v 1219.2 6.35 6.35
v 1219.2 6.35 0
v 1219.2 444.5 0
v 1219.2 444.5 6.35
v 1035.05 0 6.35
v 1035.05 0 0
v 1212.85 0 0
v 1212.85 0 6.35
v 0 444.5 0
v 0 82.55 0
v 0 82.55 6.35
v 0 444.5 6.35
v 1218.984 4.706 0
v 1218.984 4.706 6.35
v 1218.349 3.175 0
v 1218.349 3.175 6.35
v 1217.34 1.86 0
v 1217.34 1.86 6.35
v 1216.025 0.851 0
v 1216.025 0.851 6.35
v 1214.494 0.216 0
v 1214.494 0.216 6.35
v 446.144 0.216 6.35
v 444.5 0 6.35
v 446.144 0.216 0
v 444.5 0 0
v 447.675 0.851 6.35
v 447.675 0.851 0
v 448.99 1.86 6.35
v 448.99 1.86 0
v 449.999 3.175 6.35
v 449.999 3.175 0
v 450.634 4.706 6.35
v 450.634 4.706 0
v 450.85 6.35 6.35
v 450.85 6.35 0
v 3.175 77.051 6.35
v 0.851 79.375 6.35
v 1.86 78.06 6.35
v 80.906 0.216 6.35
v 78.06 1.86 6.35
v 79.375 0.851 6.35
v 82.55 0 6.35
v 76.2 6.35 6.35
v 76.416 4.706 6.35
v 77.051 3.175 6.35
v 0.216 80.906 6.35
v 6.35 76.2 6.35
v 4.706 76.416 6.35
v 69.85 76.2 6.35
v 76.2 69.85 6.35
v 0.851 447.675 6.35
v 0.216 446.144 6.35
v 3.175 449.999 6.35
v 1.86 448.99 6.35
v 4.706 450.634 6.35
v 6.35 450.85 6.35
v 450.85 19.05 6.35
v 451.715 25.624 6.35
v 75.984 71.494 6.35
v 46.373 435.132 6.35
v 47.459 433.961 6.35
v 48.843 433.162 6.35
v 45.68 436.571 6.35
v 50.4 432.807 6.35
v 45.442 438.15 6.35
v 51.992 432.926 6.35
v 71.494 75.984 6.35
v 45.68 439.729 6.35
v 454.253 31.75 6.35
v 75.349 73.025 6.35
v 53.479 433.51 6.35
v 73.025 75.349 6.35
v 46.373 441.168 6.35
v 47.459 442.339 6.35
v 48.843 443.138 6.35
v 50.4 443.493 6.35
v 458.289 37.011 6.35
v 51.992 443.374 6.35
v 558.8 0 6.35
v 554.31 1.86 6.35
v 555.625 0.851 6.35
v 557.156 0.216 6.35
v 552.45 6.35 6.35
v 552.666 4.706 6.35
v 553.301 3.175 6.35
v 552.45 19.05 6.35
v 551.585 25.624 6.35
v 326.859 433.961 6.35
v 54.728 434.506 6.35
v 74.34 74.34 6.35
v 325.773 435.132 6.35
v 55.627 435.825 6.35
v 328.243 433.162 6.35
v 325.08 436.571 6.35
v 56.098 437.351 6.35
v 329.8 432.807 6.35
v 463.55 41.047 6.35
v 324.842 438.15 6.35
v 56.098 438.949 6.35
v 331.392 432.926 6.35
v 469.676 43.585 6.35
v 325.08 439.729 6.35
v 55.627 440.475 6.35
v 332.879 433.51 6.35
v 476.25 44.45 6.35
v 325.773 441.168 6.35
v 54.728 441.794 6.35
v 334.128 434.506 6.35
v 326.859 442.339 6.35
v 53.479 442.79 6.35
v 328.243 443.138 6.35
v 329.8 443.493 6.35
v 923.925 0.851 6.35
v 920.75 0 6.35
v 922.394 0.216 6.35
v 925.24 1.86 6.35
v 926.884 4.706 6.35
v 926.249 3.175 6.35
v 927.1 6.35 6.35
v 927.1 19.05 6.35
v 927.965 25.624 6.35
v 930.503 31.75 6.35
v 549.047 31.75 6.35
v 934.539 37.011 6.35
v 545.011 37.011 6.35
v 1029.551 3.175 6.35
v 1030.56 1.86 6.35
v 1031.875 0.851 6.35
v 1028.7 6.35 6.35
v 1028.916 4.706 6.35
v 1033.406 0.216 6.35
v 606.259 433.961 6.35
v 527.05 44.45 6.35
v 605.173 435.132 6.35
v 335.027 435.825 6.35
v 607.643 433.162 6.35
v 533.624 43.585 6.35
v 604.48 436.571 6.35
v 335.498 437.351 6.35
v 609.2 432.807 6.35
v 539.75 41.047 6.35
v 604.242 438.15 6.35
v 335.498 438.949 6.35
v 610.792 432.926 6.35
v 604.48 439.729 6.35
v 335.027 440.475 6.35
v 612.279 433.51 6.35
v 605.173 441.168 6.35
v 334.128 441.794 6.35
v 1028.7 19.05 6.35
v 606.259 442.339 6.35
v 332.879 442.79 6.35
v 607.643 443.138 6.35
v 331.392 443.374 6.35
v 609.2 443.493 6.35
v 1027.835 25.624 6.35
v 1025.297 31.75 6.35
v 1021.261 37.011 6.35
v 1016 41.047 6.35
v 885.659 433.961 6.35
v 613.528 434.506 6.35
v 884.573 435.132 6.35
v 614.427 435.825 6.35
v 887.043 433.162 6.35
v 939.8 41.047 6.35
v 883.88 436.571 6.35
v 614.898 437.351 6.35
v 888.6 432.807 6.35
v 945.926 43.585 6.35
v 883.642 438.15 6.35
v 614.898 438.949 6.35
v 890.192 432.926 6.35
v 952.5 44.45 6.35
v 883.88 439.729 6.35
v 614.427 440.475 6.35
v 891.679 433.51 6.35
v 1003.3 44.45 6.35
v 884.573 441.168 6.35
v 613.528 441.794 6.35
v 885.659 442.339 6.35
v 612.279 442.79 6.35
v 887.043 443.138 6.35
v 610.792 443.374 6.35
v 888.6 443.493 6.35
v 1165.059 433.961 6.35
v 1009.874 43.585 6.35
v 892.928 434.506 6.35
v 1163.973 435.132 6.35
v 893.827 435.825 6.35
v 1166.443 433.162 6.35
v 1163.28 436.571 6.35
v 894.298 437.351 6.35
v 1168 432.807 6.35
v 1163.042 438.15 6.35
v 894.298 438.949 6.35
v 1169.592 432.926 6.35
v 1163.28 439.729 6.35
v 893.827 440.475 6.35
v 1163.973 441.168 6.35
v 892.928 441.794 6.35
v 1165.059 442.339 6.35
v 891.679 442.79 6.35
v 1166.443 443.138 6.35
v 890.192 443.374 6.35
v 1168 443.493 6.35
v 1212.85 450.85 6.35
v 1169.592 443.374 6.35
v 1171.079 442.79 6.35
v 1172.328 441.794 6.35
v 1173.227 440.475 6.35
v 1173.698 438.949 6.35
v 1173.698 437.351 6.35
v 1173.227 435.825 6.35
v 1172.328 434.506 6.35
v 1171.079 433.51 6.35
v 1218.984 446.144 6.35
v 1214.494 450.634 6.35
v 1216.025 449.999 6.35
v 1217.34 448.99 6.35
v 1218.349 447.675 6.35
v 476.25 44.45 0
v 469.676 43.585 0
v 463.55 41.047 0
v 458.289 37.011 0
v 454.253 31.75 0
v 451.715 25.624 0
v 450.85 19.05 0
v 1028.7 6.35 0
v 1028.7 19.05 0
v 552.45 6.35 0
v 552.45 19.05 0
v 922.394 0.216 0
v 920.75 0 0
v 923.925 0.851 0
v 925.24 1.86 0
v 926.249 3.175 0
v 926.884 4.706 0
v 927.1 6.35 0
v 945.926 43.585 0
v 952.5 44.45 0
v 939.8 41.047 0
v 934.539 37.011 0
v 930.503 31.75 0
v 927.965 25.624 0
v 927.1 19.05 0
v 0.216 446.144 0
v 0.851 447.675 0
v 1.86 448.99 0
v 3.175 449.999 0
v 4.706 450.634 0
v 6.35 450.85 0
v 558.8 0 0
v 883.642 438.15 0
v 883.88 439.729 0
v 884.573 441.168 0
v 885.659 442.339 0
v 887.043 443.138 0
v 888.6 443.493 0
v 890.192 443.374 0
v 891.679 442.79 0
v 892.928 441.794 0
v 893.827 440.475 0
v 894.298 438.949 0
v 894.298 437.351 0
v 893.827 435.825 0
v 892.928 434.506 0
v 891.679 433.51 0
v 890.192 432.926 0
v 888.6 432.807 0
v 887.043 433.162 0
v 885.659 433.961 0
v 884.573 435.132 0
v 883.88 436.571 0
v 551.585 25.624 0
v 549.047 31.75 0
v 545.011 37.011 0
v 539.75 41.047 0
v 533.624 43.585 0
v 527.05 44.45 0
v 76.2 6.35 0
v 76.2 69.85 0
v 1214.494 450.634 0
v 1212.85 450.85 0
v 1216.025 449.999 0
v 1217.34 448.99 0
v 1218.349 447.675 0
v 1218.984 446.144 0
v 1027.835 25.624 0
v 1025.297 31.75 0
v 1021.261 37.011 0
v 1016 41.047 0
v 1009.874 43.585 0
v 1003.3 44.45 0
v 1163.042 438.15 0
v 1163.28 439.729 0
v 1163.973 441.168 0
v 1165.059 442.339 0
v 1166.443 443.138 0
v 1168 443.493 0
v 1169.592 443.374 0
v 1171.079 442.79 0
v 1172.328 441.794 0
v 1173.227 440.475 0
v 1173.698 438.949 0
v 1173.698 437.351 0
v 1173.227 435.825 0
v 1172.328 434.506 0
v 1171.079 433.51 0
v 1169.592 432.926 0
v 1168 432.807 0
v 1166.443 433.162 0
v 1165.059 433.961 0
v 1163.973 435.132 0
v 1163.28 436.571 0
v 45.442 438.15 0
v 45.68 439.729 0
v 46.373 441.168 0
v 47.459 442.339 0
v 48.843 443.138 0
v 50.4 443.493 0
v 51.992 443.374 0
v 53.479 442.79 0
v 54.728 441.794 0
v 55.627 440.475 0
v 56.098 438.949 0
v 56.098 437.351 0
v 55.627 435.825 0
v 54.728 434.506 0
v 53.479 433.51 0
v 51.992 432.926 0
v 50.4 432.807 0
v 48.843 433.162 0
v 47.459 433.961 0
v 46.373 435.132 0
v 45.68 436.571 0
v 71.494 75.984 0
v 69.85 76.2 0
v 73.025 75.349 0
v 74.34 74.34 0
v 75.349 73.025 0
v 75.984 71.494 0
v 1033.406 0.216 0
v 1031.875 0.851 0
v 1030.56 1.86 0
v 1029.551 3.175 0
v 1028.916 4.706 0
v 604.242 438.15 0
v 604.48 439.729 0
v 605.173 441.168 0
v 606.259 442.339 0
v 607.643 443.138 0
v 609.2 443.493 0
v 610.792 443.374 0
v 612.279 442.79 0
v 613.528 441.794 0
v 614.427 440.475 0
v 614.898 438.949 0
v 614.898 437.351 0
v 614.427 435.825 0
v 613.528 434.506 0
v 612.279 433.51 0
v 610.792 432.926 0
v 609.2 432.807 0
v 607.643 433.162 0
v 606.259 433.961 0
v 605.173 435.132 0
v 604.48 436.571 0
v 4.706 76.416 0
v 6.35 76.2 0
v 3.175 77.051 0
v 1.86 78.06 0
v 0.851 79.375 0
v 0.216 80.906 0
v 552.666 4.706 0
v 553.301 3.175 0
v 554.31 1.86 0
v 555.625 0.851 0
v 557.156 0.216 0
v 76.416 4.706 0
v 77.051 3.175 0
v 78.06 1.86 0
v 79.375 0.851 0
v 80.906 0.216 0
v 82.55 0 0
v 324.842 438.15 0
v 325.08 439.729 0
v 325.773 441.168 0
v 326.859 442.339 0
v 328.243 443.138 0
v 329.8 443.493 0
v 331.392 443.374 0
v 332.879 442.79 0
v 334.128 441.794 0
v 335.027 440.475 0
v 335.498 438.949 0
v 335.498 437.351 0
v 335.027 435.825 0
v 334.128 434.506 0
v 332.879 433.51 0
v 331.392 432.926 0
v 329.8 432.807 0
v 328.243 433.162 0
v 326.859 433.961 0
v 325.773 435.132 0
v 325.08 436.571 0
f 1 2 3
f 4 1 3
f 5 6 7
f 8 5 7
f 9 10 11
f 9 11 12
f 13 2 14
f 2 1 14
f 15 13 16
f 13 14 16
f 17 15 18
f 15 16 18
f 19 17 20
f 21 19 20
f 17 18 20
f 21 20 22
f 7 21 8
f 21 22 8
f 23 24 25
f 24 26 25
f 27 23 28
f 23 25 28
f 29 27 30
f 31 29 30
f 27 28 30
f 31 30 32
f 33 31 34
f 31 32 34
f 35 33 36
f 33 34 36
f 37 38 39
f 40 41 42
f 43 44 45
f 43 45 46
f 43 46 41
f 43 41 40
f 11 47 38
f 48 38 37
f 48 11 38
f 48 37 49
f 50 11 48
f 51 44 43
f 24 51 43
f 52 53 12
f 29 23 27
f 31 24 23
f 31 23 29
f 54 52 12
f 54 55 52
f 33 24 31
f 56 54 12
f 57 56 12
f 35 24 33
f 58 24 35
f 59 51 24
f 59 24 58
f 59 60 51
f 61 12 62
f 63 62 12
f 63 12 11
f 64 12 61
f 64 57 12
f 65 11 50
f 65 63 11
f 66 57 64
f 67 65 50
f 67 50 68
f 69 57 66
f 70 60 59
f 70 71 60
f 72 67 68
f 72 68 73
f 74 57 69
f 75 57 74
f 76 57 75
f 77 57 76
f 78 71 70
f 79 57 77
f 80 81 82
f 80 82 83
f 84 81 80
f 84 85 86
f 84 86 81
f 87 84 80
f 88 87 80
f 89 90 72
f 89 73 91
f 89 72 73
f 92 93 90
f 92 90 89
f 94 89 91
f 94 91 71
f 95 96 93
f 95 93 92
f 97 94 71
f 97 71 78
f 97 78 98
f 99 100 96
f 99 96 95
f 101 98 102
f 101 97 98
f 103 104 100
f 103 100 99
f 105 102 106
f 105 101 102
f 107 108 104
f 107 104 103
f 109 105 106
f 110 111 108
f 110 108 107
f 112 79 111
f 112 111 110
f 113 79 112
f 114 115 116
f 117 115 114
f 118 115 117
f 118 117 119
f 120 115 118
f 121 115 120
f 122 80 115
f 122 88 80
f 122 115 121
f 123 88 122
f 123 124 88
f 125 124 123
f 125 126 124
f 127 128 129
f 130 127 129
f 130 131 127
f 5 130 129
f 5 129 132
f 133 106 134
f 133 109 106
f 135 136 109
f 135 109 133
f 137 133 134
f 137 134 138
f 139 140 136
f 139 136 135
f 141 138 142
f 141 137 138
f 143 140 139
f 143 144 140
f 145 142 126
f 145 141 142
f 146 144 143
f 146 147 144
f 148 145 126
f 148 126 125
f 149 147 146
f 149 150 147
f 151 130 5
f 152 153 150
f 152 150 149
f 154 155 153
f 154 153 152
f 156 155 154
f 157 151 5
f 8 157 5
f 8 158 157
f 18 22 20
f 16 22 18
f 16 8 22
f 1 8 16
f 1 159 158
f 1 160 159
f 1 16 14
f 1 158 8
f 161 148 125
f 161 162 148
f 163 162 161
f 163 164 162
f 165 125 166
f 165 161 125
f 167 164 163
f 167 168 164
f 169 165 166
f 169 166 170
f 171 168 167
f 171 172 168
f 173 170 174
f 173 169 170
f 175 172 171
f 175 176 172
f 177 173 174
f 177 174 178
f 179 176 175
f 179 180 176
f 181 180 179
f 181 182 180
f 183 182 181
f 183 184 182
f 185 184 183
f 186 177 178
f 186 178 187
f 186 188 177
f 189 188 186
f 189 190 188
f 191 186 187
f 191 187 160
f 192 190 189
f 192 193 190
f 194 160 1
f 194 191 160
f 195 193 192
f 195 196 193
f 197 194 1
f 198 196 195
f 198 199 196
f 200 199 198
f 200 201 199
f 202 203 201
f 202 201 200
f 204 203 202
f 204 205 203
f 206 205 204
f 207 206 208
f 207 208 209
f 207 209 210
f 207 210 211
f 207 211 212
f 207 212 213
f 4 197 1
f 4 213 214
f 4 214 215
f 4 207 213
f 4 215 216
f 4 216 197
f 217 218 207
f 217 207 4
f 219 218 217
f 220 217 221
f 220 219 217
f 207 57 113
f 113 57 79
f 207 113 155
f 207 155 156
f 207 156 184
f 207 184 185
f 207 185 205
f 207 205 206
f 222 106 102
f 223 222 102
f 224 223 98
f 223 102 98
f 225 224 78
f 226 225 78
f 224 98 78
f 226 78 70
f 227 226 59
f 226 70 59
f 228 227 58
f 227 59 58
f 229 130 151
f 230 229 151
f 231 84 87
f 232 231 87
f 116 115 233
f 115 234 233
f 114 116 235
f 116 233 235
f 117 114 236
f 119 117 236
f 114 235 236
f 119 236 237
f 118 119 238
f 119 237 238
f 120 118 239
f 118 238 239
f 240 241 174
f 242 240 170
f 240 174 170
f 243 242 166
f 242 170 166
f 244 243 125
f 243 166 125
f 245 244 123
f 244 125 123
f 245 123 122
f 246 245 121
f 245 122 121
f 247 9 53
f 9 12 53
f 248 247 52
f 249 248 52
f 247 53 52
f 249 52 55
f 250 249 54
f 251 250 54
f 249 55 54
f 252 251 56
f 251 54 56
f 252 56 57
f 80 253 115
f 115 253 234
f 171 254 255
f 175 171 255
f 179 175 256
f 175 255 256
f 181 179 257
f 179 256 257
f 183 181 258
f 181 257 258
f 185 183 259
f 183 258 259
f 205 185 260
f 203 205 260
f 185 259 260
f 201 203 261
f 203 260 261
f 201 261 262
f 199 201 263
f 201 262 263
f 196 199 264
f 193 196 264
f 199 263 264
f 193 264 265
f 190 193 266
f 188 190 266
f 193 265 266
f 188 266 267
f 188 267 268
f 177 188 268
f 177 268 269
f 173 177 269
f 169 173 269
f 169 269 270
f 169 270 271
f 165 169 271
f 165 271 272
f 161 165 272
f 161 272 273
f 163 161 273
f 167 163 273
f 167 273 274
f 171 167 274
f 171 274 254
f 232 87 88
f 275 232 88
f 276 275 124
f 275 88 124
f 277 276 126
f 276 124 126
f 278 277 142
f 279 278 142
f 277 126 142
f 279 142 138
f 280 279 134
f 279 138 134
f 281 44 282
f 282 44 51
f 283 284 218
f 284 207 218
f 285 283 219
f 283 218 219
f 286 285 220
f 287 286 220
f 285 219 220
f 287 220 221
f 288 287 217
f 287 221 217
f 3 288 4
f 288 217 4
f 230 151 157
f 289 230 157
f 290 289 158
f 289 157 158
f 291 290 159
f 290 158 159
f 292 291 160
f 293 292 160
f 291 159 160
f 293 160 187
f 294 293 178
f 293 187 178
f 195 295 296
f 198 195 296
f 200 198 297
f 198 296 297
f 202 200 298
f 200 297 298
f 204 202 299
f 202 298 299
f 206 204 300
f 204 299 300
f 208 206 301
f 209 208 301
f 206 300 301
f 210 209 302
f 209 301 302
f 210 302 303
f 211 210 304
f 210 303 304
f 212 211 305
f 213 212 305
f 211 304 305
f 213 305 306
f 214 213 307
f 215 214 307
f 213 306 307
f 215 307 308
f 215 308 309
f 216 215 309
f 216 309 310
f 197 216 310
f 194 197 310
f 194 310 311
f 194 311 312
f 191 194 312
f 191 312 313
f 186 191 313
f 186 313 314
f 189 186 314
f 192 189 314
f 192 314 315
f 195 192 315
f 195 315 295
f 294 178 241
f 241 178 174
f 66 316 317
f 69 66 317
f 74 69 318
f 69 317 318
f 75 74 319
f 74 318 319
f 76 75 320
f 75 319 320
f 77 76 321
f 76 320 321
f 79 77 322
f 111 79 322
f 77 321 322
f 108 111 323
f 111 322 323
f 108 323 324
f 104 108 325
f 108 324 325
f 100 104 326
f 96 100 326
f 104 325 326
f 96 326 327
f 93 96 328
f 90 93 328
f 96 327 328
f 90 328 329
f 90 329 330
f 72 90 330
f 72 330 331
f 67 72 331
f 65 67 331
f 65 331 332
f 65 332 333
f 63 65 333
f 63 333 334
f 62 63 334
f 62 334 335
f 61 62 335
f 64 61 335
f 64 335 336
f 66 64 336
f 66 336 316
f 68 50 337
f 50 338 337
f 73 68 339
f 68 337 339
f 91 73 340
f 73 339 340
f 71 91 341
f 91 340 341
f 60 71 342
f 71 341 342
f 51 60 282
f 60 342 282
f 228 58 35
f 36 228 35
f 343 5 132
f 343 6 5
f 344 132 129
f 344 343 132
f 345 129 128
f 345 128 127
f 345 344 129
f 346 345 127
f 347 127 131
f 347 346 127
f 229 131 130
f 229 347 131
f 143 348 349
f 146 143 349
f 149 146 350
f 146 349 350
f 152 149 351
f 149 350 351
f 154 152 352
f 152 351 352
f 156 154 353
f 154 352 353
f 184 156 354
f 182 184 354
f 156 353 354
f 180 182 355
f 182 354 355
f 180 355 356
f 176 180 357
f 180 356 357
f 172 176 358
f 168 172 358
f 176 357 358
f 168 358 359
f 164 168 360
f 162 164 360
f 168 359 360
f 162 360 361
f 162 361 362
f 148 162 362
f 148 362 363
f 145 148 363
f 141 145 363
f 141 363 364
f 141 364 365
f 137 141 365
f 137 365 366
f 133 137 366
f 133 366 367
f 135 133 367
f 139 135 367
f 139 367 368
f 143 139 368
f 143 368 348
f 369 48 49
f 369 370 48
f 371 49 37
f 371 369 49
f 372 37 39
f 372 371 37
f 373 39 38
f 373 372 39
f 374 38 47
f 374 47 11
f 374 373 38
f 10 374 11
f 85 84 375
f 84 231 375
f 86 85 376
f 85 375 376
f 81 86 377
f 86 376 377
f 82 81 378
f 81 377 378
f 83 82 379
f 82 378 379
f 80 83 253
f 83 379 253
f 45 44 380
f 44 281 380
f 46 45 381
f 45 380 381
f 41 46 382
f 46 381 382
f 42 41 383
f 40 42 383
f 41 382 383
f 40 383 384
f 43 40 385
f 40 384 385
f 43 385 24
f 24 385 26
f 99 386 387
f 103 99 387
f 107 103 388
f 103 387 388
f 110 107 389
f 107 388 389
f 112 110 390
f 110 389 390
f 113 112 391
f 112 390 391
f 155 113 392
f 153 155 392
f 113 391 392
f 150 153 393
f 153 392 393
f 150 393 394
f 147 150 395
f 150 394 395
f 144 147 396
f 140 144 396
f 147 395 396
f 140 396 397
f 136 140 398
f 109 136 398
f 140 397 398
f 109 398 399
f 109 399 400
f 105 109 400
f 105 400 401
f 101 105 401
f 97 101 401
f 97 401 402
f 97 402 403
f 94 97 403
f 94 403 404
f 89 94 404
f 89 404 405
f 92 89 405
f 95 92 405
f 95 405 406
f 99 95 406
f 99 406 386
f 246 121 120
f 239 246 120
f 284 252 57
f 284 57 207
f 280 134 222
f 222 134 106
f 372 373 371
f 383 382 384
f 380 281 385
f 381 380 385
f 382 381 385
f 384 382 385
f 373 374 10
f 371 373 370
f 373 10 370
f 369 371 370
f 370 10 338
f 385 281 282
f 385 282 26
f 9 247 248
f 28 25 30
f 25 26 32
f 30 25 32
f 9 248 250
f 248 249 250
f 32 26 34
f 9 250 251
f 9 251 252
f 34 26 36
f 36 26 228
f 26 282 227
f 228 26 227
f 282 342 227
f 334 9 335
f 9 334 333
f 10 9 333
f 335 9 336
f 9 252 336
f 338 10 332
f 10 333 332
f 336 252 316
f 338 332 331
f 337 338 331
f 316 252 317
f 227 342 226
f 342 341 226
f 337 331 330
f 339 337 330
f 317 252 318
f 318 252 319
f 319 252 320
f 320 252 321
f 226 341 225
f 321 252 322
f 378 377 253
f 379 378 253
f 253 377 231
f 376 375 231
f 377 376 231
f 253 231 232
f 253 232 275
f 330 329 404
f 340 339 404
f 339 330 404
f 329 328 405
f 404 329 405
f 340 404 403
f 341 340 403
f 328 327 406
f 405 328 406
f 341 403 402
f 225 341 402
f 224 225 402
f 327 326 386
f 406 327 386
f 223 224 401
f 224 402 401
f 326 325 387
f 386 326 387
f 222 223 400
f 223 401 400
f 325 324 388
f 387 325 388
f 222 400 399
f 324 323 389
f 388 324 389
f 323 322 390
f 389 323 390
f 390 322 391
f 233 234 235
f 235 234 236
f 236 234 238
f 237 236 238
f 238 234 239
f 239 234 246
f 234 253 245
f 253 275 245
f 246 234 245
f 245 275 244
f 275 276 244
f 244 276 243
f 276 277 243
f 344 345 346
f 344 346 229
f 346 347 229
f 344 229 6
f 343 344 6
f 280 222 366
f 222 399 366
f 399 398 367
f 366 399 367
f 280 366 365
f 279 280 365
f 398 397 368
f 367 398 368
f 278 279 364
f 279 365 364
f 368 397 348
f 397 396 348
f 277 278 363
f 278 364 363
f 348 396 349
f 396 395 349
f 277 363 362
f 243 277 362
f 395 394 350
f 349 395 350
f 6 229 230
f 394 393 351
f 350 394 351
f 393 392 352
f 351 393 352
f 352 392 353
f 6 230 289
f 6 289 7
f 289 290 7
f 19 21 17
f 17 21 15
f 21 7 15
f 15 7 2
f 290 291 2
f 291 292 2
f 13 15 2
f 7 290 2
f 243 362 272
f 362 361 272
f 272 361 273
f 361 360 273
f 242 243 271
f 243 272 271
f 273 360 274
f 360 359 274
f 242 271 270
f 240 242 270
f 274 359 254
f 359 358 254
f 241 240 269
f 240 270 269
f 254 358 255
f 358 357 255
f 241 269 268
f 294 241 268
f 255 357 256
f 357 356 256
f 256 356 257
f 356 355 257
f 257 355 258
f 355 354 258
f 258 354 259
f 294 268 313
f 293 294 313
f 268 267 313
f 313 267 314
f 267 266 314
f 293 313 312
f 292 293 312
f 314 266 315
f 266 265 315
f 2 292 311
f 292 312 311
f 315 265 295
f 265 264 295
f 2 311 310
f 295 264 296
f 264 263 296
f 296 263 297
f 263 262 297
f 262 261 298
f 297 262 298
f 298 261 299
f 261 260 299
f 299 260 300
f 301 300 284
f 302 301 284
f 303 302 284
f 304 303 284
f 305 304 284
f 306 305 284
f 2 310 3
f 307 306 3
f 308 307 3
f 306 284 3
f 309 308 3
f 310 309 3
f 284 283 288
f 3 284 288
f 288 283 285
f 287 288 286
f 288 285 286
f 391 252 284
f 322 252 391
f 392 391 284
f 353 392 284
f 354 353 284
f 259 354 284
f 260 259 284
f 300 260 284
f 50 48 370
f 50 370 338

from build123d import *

# Parameters (mm, degrees)
SKETCH1_W                        = 1219.2
SKETCH1_H                        = 450.85
BOSS_EXTRUDE1_DEPTH              = 6.35
CUT_EXTRUDE1_DEPTH               = 1300.905644653
LPATTERN1_COUNT                  = 2
LPATTERN1_PITCH                  = 476.25
SKETCH3_W                        = 76.2
SKETCH3_H                        = 76.2
CUT_EXTRUDE2_DEPTH               = 1300.905644653
FILLET1_R                        = 6.35
F_27_64_0_42188_DIAMETER_HOLE1_D = 10.715752
FILLET2_R                        = 6.35


with BuildPart() as part:
    # Sketch1 → Boss-Extrude1 (new body)
    with BuildSketch(Plane.XY):
        with Locations((609.6, 225.425)):
            Rectangle(SKETCH1_W, SKETCH1_H)
    extrude(amount=BOSS_EXTRUDE1_DEPTH)

    # Sketch2 → Cut-Extrude1 (cut, through all)
    with BuildSketch(Plane.XY.offset(6.35)):
        with BuildLine():
            Line((450.85, 19.05), (450.85, 0))
            Line((450.85, 0), (552.45, 0))
            Line((552.45, 0), (552.45, 19.05))
            ThreePointArc((552.45, 19.05), (545.010512242, 37.010512242), (527.05, 44.45))
            Line((527.05, 44.45), (476.25, 44.45))
            ThreePointArc((476.25, 44.45), (458.289487758, 37.010512242), (450.85, 19.05))
        make_face()
    cut_extrude1 = extrude(amount=-CUT_EXTRUDE1_DEPTH, mode=Mode.SUBTRACT)

    # LPattern1: Cut-Extrude1 ×2
    with Locations(*[(i * LPATTERN1_PITCH, 0, 0) for i in range(1, LPATTERN1_COUNT)]):
        add(cut_extrude1, mode=Mode.SUBTRACT)

    # Sketch3 → Cut-Extrude2 (cut, through all)
    with BuildSketch(Plane.XY.offset(6.35)):
        with Locations((38.1, 38.1)):
            Rectangle(SKETCH3_W, SKETCH3_H)
    extrude(amount=-CUT_EXTRUDE2_DEPTH, mode=Mode.SUBTRACT)

    # Fillet1
    fillet1_edges = [part.edges().sort_by_distance(p)[0] for p in [
        (76.2, 76.2, 3.175),
    ]]
    fillet(fillet1_edges, radius=FILLET1_R)

    # 27/64 (0.42188) Diameter Hole1 (through all)
    with Locations(Plane.XY.offset(6.35)):
        with Locations((50.8, 438.15), (330.2, 438.15), (609.6, 438.15), (889, 438.15), (1168.4, 438.15)):
            Hole(F_27_64_0_42188_DIAMETER_HOLE1_D / 2)

    # Fillet2
    fillet2_edges = [part.edges().sort_by_distance(p)[0] for p in [
        (552.45, 0, 3.175),
        (450.85, 0, 3.175),
        (1028.7, 0, 3.175),
        (927.1, 0, 3.175),
        (0, 76.2, 3.175),
        (76.2, 0, 3.175),
        (0, 450.85, 3.175),
        (1219.2, 450.85, 3.175),
        (1219.2, 0, 3.175),
    ]]
    fillet(fillet2_edges, radius=FILLET2_R)


solid = part.part
